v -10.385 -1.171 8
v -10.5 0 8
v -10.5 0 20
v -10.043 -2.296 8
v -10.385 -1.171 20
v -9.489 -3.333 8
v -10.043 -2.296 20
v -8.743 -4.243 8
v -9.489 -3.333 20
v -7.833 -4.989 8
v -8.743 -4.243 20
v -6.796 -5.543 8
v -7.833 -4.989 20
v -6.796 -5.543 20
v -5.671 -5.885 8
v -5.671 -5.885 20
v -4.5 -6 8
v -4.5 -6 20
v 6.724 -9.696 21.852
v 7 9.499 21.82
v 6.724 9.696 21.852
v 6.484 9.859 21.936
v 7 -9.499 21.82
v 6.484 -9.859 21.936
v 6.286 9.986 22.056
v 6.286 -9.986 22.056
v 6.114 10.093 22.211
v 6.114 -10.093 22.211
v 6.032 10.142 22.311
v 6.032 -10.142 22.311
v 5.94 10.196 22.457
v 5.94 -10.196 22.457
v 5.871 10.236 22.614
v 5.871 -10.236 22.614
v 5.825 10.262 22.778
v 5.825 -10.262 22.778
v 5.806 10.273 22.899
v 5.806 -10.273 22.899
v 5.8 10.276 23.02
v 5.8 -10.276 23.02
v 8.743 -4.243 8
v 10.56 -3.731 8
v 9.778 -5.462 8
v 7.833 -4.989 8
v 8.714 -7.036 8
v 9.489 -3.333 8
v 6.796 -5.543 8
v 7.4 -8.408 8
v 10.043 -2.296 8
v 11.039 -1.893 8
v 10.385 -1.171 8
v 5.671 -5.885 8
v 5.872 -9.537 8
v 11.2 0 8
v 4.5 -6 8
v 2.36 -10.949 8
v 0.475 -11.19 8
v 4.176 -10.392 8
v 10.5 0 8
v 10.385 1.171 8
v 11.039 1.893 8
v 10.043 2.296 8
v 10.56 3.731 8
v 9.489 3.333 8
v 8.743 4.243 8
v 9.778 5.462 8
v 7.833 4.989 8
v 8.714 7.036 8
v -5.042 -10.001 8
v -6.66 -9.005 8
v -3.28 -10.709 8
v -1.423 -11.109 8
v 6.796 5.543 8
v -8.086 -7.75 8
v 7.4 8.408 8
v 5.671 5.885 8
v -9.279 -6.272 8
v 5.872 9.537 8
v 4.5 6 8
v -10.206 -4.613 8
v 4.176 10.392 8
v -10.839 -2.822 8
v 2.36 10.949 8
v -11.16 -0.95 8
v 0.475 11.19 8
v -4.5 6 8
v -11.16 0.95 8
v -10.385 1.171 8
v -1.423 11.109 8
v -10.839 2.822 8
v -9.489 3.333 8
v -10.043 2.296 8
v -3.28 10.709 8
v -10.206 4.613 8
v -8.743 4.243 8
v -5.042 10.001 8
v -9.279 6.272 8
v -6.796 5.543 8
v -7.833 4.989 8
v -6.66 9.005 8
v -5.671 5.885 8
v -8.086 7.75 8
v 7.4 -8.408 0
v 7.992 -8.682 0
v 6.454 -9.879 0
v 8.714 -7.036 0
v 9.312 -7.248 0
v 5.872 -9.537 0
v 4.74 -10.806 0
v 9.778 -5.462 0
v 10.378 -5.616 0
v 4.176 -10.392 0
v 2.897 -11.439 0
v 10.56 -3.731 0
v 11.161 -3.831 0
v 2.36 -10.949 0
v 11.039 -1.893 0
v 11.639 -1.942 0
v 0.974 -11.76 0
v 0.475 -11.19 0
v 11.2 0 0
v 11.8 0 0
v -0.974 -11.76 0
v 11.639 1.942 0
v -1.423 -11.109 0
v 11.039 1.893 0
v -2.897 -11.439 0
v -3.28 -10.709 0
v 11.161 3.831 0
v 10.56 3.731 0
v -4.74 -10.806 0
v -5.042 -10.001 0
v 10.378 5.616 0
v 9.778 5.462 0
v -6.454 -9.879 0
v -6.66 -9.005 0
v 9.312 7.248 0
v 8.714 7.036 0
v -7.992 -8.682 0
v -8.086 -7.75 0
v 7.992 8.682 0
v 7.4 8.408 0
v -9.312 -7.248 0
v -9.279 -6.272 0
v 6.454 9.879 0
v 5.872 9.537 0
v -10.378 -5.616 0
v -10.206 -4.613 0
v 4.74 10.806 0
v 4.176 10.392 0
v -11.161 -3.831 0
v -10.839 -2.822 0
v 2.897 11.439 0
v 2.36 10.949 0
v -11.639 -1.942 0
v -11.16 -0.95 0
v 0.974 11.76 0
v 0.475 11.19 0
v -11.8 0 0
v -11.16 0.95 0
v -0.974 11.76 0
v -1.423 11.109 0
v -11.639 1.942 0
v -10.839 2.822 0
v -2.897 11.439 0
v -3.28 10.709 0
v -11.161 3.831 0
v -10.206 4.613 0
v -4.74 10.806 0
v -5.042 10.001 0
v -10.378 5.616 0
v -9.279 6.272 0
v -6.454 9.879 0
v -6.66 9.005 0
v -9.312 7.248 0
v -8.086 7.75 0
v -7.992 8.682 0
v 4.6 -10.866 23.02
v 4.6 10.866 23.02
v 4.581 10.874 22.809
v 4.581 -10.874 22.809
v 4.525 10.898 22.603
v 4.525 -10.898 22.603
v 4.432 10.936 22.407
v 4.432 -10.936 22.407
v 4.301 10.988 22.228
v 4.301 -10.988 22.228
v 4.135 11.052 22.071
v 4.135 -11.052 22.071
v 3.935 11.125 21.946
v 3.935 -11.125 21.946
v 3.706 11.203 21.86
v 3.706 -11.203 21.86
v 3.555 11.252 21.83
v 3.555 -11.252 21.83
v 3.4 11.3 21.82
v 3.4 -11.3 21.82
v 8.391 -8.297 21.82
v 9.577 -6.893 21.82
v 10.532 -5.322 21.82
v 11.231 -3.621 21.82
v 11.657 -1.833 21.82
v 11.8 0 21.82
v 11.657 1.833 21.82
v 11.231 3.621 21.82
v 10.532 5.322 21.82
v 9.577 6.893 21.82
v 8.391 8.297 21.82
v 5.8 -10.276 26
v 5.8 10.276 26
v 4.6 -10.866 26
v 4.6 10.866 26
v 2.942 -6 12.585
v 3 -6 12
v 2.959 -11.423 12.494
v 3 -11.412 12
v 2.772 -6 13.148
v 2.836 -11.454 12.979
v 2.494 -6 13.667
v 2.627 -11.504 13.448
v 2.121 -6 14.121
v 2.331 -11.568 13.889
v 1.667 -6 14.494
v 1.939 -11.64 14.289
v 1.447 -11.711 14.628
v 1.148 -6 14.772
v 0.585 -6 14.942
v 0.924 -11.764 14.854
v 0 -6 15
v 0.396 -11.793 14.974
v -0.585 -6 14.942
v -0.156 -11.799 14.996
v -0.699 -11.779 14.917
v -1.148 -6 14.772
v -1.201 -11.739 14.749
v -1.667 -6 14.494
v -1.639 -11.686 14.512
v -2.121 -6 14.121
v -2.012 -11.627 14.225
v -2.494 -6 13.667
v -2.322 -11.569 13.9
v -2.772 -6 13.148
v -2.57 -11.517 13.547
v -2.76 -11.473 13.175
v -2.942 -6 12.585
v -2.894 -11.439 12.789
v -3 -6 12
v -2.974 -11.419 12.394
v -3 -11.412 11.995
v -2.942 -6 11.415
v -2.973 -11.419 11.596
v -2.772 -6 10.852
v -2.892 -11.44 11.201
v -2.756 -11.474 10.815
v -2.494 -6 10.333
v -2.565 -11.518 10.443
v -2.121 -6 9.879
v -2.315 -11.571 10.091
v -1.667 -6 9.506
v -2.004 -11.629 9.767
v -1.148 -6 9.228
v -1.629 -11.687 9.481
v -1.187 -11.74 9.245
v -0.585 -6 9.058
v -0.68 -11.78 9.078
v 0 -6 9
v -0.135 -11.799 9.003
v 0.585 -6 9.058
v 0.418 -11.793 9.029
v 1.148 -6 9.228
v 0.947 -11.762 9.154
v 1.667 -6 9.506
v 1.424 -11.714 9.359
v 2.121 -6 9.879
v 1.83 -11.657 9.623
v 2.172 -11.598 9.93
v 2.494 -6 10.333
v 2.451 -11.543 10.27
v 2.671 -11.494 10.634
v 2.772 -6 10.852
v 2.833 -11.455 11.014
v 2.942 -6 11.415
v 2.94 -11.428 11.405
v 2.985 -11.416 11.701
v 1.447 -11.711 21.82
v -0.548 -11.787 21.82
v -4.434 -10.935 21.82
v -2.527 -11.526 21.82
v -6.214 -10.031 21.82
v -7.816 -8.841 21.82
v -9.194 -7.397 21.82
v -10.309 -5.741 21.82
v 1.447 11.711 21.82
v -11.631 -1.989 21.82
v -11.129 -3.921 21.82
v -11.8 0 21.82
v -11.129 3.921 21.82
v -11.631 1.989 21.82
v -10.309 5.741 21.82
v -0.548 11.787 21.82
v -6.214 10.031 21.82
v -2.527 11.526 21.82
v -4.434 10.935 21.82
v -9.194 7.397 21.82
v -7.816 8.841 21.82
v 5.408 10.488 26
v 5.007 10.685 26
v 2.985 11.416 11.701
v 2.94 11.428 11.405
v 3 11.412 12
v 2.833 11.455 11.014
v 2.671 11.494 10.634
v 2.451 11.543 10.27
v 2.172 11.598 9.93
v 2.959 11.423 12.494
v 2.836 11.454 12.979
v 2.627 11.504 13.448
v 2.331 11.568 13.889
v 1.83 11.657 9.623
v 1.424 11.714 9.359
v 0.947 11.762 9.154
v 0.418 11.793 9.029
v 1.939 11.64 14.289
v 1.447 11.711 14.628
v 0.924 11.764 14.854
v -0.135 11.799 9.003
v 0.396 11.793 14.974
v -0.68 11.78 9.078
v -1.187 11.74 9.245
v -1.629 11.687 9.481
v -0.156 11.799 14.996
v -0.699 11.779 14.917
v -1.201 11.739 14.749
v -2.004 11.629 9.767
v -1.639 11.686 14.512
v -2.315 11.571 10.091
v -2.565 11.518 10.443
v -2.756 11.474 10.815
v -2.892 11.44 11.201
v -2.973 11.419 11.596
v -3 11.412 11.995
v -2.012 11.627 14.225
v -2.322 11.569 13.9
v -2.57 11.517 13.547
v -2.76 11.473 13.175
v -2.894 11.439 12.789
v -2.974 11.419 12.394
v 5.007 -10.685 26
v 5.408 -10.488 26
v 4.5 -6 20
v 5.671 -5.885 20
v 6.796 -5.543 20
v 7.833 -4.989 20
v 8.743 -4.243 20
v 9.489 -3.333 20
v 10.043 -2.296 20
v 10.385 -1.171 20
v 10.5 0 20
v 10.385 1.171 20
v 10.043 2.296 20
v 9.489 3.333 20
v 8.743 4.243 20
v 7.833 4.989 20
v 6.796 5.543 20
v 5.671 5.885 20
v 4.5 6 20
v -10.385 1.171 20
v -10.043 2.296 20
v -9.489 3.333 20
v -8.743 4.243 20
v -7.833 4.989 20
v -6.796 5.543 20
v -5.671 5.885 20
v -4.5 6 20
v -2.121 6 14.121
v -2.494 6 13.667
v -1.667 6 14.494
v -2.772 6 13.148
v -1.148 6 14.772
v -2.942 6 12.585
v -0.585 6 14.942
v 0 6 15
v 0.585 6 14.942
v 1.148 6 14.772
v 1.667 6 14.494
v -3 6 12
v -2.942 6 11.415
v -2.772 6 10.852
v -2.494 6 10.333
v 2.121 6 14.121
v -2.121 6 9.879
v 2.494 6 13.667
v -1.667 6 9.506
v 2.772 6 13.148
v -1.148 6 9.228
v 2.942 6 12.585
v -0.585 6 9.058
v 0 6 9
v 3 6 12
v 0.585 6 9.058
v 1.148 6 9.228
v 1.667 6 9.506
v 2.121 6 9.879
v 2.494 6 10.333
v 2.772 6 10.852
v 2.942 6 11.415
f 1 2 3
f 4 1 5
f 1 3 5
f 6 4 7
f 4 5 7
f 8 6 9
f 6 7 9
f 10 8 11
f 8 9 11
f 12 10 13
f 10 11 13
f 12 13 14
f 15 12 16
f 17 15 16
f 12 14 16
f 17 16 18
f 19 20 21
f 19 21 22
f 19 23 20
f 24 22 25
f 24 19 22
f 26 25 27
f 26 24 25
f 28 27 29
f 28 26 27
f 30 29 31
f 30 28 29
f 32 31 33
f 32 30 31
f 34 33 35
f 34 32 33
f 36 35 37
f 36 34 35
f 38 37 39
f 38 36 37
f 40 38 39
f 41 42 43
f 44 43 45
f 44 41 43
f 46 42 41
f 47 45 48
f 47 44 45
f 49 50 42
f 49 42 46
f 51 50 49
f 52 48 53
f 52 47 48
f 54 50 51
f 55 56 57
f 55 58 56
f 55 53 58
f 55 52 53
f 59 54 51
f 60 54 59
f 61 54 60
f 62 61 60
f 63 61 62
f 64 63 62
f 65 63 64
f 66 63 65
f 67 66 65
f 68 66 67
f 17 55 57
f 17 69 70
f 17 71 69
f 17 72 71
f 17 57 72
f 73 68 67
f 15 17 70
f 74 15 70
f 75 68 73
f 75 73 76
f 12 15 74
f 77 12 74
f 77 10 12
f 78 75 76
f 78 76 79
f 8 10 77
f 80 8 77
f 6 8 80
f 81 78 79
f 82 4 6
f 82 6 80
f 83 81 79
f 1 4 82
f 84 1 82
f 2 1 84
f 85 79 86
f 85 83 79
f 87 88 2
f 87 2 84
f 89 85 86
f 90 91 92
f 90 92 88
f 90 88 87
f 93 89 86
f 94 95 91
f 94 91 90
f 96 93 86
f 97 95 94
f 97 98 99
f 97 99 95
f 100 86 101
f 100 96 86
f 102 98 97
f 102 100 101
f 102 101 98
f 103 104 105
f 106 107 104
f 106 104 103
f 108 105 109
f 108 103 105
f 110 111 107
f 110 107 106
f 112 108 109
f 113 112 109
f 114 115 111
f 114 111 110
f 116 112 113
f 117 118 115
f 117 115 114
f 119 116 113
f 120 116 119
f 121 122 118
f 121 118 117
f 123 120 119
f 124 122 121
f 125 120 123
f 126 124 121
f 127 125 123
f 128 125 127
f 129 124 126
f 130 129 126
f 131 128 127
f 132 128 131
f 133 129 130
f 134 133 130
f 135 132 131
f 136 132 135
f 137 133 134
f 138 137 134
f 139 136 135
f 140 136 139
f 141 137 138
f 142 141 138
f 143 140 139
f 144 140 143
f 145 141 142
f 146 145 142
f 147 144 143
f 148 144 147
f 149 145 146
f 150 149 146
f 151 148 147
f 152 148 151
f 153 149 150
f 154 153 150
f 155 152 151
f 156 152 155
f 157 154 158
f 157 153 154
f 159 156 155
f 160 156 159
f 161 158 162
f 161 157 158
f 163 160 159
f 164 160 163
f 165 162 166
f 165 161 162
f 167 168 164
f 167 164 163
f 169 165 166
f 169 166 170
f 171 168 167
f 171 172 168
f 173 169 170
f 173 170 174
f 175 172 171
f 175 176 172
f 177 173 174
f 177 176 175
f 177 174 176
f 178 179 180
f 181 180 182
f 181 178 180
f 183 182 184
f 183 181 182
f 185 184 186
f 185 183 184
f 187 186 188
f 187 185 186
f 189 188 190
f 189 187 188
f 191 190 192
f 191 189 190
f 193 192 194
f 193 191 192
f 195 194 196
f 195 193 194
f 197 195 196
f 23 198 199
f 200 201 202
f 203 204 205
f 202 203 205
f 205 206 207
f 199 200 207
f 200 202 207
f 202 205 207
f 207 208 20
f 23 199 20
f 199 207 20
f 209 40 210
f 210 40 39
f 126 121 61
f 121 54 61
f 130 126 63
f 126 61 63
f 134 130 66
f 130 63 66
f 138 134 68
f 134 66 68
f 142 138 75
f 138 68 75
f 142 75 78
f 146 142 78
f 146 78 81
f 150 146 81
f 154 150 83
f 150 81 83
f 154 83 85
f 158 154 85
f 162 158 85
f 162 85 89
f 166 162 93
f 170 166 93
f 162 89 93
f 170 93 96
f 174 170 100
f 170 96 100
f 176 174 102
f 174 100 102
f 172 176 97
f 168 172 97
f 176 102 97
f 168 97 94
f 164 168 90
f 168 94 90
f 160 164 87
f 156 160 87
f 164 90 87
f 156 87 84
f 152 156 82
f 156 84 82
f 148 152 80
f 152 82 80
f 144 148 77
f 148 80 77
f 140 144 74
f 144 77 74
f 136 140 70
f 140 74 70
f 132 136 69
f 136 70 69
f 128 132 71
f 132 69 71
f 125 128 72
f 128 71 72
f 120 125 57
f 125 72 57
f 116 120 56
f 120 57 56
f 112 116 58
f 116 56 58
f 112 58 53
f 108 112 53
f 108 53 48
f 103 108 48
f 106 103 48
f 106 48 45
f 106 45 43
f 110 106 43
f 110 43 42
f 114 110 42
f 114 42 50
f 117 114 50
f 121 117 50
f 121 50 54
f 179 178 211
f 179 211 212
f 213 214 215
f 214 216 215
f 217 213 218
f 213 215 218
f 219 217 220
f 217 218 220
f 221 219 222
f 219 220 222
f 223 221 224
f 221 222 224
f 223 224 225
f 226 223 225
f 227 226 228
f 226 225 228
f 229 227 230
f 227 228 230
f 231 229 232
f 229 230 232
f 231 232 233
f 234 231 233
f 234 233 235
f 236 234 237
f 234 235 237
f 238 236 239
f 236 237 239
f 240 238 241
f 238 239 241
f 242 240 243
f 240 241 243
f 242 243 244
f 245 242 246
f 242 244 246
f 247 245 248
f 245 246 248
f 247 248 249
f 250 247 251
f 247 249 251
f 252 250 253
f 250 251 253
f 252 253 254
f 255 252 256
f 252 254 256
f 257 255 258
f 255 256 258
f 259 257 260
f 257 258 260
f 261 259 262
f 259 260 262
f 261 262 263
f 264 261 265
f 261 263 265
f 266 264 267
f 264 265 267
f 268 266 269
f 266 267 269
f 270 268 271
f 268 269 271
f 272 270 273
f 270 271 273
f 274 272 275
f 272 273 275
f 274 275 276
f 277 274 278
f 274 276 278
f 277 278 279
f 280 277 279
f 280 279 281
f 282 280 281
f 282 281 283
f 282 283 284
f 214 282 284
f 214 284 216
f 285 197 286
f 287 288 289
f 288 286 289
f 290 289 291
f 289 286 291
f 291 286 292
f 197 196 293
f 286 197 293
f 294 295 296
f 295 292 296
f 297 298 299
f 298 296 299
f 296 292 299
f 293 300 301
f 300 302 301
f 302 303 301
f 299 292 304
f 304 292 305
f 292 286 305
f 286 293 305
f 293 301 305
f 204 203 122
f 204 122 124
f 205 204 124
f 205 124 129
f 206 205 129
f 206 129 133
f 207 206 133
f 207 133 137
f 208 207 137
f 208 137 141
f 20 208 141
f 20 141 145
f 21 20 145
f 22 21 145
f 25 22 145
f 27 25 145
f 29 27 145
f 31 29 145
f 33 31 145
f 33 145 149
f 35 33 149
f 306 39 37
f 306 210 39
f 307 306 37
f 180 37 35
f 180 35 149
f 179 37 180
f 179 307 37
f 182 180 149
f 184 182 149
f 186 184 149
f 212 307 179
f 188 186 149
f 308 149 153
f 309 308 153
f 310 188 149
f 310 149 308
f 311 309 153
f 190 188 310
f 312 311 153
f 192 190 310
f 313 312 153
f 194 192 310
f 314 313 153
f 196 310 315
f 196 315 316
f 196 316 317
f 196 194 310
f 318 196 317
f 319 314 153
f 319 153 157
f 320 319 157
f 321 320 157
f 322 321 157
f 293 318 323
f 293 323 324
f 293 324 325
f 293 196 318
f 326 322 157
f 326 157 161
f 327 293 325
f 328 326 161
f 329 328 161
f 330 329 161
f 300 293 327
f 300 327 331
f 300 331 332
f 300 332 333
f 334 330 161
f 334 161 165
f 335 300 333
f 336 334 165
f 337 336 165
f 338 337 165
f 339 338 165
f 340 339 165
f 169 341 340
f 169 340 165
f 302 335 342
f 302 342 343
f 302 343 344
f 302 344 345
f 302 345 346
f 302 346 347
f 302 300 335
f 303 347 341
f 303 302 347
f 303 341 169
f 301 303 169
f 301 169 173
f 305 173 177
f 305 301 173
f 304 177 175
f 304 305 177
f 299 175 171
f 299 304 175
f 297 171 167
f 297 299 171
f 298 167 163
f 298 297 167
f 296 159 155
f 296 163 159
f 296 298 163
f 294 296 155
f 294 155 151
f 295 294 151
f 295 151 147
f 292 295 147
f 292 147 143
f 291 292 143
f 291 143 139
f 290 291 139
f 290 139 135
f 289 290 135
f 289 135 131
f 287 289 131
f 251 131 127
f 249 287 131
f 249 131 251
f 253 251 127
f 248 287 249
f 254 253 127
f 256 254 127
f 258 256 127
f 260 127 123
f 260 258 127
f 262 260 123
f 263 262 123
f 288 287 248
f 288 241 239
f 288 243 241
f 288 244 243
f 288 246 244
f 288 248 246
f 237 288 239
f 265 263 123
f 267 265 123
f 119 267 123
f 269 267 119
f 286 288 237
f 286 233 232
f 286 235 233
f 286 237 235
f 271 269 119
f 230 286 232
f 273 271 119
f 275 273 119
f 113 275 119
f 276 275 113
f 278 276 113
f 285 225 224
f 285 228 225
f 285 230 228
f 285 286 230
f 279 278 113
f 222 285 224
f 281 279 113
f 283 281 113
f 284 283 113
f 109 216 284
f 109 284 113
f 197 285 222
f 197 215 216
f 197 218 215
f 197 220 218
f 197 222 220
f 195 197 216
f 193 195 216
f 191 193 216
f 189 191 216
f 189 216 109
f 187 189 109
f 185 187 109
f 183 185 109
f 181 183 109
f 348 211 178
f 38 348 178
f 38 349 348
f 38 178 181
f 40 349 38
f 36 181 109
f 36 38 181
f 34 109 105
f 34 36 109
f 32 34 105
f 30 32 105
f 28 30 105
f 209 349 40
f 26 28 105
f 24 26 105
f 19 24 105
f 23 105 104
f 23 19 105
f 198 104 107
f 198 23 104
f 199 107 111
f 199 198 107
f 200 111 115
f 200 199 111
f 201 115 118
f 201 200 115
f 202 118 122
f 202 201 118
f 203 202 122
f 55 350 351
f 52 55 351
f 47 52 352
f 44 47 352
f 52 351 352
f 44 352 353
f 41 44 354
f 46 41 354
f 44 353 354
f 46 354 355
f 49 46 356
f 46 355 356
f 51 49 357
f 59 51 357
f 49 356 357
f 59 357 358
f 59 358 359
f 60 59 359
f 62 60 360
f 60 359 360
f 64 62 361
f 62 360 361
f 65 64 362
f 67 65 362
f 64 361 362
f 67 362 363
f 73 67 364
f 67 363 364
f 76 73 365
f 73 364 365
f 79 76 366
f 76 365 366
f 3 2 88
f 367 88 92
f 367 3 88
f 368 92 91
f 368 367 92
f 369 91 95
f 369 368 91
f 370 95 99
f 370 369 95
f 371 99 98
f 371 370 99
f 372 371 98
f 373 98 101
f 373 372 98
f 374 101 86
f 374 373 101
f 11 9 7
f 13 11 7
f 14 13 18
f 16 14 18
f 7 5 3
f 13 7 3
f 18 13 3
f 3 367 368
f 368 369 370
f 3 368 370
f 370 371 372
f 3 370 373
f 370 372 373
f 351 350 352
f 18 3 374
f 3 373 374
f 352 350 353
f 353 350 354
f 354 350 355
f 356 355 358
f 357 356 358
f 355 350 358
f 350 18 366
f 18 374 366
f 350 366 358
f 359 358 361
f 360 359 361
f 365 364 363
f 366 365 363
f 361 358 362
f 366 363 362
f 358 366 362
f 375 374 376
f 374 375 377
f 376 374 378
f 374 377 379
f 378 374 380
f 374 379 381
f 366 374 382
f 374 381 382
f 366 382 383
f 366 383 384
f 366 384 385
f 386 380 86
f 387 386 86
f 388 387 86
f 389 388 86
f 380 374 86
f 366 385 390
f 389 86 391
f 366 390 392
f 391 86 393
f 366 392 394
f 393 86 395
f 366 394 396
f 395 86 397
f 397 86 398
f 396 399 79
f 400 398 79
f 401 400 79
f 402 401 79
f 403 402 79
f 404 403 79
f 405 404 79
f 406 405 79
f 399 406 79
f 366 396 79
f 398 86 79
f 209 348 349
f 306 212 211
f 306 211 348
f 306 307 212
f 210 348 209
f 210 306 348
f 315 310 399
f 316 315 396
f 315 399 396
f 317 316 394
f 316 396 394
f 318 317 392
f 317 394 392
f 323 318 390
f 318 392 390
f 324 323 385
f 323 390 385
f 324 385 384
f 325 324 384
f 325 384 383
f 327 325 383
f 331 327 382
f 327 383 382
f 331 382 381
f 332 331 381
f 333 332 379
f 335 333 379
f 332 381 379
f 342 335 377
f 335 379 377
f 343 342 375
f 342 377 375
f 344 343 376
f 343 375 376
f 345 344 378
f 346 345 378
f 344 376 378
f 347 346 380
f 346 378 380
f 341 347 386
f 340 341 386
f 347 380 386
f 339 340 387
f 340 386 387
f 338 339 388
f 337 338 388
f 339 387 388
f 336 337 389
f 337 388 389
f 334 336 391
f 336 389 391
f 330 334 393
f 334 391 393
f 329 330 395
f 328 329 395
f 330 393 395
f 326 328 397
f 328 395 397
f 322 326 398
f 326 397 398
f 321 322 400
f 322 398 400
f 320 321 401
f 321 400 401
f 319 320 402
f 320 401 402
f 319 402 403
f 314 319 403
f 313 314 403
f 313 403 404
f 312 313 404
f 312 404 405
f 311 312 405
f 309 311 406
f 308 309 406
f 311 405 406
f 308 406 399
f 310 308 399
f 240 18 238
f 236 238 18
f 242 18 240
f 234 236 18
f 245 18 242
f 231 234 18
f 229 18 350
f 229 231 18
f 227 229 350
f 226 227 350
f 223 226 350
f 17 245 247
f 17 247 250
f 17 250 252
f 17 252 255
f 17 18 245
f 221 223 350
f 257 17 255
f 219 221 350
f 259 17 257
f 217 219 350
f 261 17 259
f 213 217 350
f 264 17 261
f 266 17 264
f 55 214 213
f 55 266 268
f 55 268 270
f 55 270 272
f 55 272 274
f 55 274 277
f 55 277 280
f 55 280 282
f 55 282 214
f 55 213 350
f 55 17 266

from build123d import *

# Parameters (mm, degrees)
F0_W      = 11.8
F0_H      = 21.82
F3_W      = 1.2
F3_H      = 40
F4_DEPTH  = 26
F5_R      = 11.8
F6_DEPTH  = 30
F2_W      = 11.2
F2_H      = 8
F9_W      = 21
F9_H      = 12
F10_DEPTH = 20
F11_R     = 5.99999
F13_R     = 1.2
F14_R     = 3
F15_DEPTH = 12.5


# Not quite as in the source:
# - a fillet or chamfer is up to 0.001 mm smaller than in the source, because OpenCascade refuses the exact size


with BuildPart() as f1:
    # F0 (on Front) → F1 (revolve)
    with BuildSketch(Plane.XZ):
        with Locations((5.9, 10.91)):
            Rectangle(F0_W, F0_H)
    revolve(axis=Axis((0, 0, 10.91), (0, 0, 1)))


with BuildPart() as f4:
    # F3 (on Top) → F4 (new body)
    with BuildSketch(Plane.XY):
        with Locations((5.2, 0)):
            Rectangle(F3_W, F3_H)
    extrude(amount=F4_DEPTH)


with BuildPart() as f6_tool:
    # F5 (on Top) → F6 (new body)
    with BuildSketch(Plane.XY):
        Circle(F5_R)
    extrude(amount=F6_DEPTH)


with BuildPart() as f1_1:
    add(f1.part)

    # F6: intersect by f6_tool
    add(f6_tool.part, mode=Mode.INTERSECT)


with BuildPart() as f4_1:
    add(f4.part)

    # F6: intersect by f6_tool
    add(f6_tool.part, mode=Mode.INTERSECT)

    # F7: union F1
    add(f1_1.part)

    # F2 (on Front) → F8 (revolve, cut)
    with BuildSketch(Plane.XZ):
        with Locations((5.6, 4)):
            Rectangle(F2_W, F2_H)
    revolve(axis=Axis((0, 0, 4), (0, 0, 1)), mode=Mode.SUBTRACT)


with BuildPart() as f10:
    # F9 (on Top) → F10 (new body)
    with BuildSketch(Plane.XY):
        Rectangle(F9_W, F9_H)
    extrude(amount=F10_DEPTH)

    # F11 (radius 6 in the source; OpenCascade refuses exactly that, so slightly less here)
    f11_edges = [f10.edges().sort_by_distance(p)[0] for p in [
        (-10.5, -6, 10),
        (10.5, -6, 10),
        (-10.5, 6, 10),
        (10.5, 6, 10),
    ]]
    fillet(f11_edges, radius=F11_R)


with BuildPart() as f4_2:
    add(f4_1.part)

    # F12: cut F10
    add(f10.part, mode=Mode.SUBTRACT)

    # F13
    f13_edges = [f4_2.edges().sort_by_distance(p)[0] for p in [
        (4.6, 0, 21.82),
        (5.8, 0, 21.82),
    ]]
    fillet(f13_edges, radius=F13_R)

    # F14 (on Front) → F15 (cut, symmetric)
    with BuildSketch(Plane.XZ):
        with Locations((0, 12)):
            Circle(F14_R)
    extrude(amount=F15_DEPTH, both=True, mode=Mode.SUBTRACT)


solid = f4_2.part
